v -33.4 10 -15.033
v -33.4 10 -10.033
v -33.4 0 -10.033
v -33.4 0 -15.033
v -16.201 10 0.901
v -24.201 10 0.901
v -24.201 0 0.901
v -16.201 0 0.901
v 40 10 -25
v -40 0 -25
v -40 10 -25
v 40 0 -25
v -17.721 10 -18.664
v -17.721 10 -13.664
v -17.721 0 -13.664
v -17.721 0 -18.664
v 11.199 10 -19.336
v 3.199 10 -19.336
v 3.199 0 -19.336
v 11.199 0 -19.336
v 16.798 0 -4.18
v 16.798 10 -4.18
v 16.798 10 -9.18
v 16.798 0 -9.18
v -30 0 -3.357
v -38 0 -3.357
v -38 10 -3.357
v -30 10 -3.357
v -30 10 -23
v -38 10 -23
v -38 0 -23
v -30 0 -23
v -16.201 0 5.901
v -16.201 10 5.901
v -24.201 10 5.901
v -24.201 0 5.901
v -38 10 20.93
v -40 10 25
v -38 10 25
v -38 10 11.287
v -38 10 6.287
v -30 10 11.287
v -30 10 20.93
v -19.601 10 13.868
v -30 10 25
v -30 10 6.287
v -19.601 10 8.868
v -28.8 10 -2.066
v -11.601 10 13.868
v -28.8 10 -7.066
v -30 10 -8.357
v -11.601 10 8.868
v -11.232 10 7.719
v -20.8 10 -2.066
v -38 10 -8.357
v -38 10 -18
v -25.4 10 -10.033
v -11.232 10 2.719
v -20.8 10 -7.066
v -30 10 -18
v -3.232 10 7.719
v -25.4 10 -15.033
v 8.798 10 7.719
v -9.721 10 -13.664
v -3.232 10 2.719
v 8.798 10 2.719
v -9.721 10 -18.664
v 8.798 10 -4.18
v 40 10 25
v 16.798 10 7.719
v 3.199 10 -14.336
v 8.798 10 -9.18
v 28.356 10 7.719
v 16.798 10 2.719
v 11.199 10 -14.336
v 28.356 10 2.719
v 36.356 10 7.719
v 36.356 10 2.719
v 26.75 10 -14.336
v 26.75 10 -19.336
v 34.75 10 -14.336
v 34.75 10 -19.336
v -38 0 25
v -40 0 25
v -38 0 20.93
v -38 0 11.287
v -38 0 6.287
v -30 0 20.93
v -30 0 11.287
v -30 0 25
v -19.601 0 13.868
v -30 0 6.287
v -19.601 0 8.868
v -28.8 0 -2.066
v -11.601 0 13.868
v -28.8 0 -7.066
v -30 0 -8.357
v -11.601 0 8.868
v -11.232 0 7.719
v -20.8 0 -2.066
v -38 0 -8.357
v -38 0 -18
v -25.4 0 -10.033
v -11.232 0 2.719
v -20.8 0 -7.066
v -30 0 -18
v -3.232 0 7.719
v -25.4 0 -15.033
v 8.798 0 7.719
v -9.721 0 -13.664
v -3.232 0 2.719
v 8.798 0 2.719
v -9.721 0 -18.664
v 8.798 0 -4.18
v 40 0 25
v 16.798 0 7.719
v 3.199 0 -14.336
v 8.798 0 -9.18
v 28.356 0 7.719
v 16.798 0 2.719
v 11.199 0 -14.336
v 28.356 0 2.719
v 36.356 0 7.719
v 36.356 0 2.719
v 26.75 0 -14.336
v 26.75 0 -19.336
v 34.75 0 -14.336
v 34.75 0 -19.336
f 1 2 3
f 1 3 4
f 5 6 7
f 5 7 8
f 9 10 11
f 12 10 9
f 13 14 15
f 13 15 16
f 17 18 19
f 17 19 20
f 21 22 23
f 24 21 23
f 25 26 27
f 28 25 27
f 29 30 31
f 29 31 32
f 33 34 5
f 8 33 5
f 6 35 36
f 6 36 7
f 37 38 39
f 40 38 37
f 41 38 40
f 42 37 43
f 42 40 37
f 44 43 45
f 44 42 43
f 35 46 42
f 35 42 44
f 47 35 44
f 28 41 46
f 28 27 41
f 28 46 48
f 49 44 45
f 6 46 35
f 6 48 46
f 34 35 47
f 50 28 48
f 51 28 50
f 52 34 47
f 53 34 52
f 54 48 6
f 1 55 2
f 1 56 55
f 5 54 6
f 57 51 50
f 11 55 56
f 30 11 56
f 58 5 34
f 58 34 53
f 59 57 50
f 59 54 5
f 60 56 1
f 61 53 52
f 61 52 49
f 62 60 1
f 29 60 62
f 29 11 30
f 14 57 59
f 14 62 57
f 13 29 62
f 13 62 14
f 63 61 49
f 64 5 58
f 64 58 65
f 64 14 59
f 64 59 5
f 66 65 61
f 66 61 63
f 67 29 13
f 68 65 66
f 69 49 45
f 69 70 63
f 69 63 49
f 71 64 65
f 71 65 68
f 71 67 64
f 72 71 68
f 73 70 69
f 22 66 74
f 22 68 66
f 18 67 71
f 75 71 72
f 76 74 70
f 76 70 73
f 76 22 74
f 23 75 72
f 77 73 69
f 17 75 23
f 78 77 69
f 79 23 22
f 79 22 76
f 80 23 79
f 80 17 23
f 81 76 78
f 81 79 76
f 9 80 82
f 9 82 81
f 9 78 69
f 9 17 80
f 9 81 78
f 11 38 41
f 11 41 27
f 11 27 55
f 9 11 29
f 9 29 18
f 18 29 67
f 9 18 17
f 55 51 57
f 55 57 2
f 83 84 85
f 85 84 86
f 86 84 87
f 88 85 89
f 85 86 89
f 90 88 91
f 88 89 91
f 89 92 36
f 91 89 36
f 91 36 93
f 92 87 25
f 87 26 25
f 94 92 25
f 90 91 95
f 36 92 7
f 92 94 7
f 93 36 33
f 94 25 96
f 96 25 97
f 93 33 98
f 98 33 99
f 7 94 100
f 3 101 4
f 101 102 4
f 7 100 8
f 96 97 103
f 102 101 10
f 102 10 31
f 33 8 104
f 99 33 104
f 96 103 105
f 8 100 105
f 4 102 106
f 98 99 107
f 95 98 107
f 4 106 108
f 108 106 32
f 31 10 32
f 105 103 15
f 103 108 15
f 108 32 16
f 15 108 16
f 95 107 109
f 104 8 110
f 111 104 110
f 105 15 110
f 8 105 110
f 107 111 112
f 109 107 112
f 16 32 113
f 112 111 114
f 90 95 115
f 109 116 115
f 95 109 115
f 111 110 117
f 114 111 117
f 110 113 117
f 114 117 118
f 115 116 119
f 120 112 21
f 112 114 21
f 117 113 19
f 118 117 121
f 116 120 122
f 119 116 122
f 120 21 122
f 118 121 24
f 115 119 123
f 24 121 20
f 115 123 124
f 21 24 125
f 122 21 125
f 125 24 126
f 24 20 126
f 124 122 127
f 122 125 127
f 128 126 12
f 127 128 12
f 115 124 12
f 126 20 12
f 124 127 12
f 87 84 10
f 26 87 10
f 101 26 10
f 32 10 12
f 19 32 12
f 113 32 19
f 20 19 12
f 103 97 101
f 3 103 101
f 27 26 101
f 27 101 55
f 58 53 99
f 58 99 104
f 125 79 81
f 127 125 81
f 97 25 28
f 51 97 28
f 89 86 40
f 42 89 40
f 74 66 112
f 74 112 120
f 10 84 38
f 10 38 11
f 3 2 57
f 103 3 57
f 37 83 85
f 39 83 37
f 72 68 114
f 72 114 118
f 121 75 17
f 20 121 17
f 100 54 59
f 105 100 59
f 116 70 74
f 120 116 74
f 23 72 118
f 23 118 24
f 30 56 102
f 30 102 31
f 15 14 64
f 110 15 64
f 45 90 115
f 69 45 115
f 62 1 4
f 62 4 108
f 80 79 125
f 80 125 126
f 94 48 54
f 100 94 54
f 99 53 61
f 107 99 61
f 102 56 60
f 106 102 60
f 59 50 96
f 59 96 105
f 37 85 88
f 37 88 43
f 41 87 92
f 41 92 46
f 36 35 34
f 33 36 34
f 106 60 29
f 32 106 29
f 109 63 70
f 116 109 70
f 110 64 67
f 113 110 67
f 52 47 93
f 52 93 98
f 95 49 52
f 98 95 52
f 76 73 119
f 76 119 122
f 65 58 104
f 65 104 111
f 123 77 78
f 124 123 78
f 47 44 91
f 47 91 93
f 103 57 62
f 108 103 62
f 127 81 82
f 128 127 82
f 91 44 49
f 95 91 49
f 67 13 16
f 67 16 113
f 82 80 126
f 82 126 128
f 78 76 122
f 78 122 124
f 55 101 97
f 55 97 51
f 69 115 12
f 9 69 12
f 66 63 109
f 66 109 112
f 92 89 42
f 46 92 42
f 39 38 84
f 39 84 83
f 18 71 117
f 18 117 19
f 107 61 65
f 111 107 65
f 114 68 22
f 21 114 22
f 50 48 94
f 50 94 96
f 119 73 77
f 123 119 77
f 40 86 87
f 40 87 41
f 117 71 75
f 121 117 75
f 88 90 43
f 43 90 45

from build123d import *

# Parameters (mm, degrees)
SKETCH1_W               = 80
SKETCH1_H               = 50
BOSS_EXTRUDE1_DEPTH     = 10
SKETCH2_W               = 8
SKETCH2_H               = 5
CUT_EXTRUDE1_DEPTH      = 49.218253805
CRVPATTERN4_START       = -38
CRVPATTERN4_OUTLINE_W   = 10
CRVPATTERN4_OUTLINE_H   = 4.069772856
CRVPATTERN4_OUTLINE_H_2 = 5
CRVPATTERN4_DEPTH       = 8
CRVPATTERN5_COUNT       = 5
CRVPATTERN5_PITCH       = 9.199623468


# Read off the part's stored shape, not the designer's step: CrvPattern4
with BuildPart() as part:
    # Sketch1 → Boss-Extrude1 (new body)
    with BuildSketch(Plane(origin=(0, 0, 0), x_dir=(1, 0, 0), z_dir=(0, 1, 0))):
        Rectangle(SKETCH1_W, SKETCH1_H)
    extrude(amount=BOSS_EXTRUDE1_DEPTH)

    # Sketch2 → Cut-Extrude1 (cut, through all)
    with BuildSketch(Plane(origin=(0, 10, 0), x_dir=(1, 0, 0), z_dir=(0, 1, 0))):
        with Locations((-34, 20.5)):
            Rectangle(SKETCH2_W, SKETCH2_H)
    cut_extrude1 = extrude(amount=-CUT_EXTRUDE1_DEPTH, mode=Mode.SUBTRACT)

    # CrvPattern4 outline → CrvPattern4 (cut)
    with BuildSketch(Plane.YZ.offset(CRVPATTERN4_START)):
        with Locations((5, 22.965113572)):
            Rectangle(CRVPATTERN4_OUTLINE_W, CRVPATTERN4_OUTLINE_H)
        with Locations((5, 8.786818096)):
            Rectangle(CRVPATTERN4_OUTLINE_W, CRVPATTERN4_OUTLINE_H_2)
        with Locations((5, -5.856590952)):
            Rectangle(CRVPATTERN4_OUTLINE_W, CRVPATTERN4_OUTLINE_H_2)
    extrude(amount=CRVPATTERN4_DEPTH, mode=Mode.SUBTRACT)

    # CrvPattern5: Cut-Extrude1 ×5
    with Locations(*[Vector(0.4999999999066592, 0, 0.866025403838329) * (i * CRVPATTERN5_PITCH) for i in range(1, CRVPATTERN5_COUNT)]):
        add(cut_extrude1, mode=Mode.SUBTRACT)

    # Sketch-Pattern1: Cut-Extrude1 at 7 more places
    with Locations((20.278987, 0, 4.33593), (41.199189, 0, 3.664318), (64.749753, 0, 3.664318), (66.35627, 0, 25.718932), (46.79827, 0, 25.718932), (26.76839, 0, 25.718932), (46.79827, 0, 13.819596)):
        add(cut_extrude1, mode=Mode.SUBTRACT)


solid = part.part
